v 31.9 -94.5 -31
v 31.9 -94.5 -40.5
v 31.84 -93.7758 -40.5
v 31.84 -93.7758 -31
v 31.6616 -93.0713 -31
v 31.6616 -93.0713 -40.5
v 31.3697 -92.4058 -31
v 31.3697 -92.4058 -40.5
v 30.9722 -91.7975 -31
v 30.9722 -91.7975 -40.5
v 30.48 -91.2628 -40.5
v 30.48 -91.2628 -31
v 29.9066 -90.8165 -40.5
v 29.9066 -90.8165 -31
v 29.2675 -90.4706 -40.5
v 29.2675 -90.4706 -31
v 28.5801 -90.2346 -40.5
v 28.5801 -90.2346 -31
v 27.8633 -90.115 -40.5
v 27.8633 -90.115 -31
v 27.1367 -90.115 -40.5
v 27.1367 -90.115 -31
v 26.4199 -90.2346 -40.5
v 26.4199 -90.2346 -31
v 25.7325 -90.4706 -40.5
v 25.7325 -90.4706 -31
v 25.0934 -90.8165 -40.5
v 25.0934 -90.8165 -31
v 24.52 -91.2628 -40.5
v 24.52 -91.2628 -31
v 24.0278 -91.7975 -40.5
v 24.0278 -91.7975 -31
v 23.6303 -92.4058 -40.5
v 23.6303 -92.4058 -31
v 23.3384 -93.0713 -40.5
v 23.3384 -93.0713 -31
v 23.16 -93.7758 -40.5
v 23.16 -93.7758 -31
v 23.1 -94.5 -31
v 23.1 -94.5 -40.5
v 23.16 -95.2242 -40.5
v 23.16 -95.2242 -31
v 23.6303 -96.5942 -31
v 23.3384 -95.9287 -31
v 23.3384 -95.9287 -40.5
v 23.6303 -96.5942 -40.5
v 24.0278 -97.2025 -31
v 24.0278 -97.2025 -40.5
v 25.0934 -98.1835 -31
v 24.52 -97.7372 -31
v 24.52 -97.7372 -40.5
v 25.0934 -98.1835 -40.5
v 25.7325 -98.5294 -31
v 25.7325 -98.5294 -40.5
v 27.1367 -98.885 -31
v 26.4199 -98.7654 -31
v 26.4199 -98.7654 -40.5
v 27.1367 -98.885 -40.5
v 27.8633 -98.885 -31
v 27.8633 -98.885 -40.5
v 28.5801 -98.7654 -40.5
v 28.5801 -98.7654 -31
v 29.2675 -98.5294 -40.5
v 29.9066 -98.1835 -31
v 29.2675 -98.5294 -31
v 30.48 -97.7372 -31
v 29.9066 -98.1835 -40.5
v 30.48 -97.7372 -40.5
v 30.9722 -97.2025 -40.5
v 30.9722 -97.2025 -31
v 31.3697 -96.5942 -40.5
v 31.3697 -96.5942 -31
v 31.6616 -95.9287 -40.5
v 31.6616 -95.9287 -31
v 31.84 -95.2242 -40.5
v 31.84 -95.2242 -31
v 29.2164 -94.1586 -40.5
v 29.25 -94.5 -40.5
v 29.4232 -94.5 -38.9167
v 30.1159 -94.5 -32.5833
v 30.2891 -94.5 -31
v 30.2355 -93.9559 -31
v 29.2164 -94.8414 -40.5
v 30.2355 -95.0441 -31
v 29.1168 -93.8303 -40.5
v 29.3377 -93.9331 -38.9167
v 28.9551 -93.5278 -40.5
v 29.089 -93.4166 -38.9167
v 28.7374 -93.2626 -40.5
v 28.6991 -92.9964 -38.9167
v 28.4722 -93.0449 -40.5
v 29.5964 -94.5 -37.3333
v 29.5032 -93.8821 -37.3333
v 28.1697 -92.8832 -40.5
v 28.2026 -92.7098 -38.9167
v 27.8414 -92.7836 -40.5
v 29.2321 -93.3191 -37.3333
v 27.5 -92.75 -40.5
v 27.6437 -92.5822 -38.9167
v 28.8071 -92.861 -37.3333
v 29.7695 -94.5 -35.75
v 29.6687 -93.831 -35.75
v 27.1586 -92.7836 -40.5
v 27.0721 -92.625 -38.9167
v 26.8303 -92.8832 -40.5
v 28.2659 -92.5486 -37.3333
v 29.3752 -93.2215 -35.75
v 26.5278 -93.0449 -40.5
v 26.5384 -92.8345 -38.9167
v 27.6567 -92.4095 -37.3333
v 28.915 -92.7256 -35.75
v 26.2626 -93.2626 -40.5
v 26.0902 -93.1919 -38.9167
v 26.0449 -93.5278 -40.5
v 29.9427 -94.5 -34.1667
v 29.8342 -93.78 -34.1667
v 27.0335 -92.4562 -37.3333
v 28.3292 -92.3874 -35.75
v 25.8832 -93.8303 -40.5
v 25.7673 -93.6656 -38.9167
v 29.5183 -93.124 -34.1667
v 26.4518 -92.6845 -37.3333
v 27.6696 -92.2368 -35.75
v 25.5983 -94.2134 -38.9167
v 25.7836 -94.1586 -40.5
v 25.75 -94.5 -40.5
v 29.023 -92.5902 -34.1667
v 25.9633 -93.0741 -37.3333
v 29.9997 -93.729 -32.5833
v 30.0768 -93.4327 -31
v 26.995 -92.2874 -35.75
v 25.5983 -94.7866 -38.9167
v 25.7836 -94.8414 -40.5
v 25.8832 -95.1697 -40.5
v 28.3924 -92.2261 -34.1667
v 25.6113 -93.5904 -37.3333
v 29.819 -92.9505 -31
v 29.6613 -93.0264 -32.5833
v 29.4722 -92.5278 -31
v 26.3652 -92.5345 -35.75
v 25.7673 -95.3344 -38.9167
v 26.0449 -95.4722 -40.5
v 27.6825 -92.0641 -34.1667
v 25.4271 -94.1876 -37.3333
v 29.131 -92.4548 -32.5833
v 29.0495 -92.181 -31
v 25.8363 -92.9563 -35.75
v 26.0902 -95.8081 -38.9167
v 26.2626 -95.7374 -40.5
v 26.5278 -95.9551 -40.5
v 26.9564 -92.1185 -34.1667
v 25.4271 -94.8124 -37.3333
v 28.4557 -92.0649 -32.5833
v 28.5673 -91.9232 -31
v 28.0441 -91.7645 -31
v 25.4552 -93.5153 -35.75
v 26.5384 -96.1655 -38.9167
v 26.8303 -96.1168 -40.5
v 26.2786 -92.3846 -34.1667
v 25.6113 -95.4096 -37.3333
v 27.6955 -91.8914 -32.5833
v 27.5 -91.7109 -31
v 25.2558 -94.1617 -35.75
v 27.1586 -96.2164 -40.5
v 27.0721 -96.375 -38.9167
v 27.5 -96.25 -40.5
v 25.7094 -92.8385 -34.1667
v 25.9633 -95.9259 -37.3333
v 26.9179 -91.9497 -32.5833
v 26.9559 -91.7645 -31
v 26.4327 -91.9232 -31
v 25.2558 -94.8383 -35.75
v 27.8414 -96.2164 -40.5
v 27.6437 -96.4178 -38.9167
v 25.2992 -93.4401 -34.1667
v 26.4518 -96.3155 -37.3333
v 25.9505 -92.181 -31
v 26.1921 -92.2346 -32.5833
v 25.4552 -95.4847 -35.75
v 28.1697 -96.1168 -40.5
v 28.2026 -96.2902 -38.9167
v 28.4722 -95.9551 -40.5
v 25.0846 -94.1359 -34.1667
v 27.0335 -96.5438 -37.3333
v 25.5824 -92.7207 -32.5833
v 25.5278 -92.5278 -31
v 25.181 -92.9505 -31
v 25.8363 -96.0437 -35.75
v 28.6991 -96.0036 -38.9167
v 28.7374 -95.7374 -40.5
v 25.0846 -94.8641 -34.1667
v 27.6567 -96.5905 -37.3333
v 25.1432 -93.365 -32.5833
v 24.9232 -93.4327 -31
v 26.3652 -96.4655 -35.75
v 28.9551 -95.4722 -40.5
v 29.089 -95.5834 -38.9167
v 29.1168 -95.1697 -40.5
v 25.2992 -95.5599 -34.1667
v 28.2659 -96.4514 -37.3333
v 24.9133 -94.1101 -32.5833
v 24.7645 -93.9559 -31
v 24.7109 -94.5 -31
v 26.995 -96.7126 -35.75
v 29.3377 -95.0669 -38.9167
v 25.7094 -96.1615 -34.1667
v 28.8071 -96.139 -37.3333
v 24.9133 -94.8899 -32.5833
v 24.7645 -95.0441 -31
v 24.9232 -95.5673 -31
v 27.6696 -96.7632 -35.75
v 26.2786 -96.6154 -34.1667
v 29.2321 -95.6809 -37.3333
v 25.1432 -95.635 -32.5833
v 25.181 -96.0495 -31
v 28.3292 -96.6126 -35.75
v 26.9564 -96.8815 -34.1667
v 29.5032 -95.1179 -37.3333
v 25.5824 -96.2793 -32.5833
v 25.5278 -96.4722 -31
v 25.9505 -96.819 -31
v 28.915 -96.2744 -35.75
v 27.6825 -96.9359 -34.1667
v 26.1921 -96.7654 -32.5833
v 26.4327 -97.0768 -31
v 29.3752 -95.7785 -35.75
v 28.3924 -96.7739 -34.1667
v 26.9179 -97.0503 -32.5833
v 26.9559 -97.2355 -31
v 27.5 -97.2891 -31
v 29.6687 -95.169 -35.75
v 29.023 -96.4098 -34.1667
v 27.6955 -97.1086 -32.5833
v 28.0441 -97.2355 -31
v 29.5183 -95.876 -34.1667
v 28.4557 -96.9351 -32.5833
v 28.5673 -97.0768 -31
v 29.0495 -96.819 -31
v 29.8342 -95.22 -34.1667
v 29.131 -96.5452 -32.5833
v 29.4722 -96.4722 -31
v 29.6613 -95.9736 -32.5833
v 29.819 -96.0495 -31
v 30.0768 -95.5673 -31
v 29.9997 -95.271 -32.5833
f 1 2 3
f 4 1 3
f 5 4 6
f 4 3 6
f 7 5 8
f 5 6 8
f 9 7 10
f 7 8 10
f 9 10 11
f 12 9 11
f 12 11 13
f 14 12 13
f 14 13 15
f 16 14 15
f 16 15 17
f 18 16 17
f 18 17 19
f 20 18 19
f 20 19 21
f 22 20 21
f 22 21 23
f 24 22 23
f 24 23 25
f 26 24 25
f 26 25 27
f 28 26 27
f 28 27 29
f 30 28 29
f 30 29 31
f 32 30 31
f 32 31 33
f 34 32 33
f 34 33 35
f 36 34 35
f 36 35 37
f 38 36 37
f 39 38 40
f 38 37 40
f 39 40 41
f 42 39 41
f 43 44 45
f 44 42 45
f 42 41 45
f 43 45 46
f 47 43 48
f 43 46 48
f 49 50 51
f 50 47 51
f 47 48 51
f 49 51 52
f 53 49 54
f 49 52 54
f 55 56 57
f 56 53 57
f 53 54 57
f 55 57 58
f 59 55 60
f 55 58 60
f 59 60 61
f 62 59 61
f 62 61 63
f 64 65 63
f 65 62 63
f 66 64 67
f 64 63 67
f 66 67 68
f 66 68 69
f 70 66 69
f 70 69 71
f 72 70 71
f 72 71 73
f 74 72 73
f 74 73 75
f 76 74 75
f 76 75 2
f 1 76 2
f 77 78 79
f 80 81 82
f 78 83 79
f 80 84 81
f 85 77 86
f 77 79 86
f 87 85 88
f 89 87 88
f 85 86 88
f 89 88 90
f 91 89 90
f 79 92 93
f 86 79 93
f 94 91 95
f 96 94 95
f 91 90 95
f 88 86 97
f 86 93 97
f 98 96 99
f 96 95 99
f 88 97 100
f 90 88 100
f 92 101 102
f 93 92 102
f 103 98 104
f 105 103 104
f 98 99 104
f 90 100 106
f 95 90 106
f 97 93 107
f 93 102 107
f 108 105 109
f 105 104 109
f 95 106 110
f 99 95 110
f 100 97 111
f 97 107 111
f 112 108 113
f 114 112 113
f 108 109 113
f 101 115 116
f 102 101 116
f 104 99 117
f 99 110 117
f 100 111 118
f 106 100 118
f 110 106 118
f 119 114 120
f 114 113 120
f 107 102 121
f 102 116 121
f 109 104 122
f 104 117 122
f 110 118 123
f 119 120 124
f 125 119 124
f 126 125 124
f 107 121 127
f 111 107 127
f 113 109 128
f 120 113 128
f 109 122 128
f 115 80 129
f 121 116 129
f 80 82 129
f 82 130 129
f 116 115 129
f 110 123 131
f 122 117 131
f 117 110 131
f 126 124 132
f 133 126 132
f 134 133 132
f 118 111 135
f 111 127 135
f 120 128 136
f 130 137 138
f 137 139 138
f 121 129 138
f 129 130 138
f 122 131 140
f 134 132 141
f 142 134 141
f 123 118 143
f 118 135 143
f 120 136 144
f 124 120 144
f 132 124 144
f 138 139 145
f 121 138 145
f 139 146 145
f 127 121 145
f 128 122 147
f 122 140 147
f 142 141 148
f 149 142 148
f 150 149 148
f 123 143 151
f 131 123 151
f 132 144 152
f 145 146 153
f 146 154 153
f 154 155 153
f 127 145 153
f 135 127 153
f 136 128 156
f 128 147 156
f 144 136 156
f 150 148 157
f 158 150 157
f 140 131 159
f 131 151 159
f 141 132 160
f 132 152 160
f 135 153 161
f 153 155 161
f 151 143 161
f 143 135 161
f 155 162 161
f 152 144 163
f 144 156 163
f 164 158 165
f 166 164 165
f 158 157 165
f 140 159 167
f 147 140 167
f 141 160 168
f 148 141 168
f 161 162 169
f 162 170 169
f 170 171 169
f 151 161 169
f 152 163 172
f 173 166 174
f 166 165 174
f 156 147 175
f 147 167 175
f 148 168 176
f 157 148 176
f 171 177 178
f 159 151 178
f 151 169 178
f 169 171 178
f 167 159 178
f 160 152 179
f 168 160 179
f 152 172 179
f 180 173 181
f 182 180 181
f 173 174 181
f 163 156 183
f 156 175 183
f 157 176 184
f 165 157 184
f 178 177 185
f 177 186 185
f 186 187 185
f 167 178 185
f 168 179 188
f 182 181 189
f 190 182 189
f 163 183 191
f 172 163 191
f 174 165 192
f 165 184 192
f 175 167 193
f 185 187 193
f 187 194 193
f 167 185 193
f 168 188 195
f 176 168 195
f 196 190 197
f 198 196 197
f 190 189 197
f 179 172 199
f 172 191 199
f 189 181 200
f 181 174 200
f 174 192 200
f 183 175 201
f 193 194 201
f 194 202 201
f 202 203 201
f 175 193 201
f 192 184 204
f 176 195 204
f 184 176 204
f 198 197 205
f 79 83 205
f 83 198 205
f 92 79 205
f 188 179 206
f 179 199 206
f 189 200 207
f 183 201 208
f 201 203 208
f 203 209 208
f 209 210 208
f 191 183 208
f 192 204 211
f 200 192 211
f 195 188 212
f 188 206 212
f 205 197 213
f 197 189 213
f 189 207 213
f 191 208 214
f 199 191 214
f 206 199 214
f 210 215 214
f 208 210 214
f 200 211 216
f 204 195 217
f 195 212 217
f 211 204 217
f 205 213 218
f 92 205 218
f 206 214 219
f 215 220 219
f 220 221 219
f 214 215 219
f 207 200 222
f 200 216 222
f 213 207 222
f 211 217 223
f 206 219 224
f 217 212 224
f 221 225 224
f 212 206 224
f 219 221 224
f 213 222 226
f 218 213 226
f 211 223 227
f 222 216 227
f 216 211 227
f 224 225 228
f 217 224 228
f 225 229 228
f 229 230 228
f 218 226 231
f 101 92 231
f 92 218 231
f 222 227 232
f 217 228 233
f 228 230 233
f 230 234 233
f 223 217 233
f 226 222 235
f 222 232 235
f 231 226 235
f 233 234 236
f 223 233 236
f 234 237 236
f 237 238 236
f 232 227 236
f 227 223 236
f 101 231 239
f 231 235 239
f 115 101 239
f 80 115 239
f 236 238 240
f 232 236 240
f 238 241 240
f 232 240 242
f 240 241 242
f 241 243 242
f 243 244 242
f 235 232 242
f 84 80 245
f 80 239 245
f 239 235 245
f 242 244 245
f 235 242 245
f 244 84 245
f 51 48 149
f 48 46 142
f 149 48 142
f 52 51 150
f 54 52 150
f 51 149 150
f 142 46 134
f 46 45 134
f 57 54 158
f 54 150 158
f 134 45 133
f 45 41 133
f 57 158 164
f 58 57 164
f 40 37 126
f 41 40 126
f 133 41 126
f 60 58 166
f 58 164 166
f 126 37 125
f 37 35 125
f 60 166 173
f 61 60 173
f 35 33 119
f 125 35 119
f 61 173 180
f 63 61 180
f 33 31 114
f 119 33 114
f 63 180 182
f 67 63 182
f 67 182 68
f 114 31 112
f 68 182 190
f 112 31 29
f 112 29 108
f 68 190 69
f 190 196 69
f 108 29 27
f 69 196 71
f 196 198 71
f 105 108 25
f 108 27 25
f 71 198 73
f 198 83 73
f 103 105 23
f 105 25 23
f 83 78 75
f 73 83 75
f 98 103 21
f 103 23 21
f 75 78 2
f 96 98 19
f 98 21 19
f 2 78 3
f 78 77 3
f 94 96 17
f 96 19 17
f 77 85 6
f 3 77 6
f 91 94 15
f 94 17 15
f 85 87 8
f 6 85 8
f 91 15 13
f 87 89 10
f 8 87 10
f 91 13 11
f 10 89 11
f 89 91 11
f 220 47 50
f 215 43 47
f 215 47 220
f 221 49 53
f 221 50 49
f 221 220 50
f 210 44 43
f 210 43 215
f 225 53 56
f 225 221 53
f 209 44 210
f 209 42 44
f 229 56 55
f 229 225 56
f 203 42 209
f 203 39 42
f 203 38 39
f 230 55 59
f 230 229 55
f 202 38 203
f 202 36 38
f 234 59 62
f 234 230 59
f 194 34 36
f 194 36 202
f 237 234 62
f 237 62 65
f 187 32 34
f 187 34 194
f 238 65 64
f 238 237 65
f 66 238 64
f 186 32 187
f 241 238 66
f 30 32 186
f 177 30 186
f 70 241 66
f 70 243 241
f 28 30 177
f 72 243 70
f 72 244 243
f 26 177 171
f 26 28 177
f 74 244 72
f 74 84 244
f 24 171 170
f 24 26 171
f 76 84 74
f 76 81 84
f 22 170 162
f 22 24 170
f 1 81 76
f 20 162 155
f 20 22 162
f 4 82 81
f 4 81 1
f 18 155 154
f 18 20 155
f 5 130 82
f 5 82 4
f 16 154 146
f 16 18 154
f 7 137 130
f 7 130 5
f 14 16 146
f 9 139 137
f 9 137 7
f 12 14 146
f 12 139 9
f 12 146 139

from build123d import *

# Parameters (mm, degrees)
BOX048_W          = 10
BOX048_H          = 10
BOX048_DEPTH      = 6.5
CYLINDER028_R     = 4.4
CYLINDER028_DEPTH = 16


with BuildPart() as cube010:
    # Box048 → Box048 (new body)
    with BuildSketch(Plane(origin=(22.5, -99.5, -31), x_dir=(1, 0, 0), z_dir=(0, 0, 1))):
        with Locations((5, 5)):
            Rectangle(BOX048_W, BOX048_H)
    extrude(amount=BOX048_DEPTH)


with BuildPart() as cone:
    # Cone → Cone (revolve)
    with BuildSketch(Plane(origin=(27.5, -94.5, 71), x_dir=(1, 0, 0), z_dir=(0, -1, 0))):
        Polygon((0, 0), (1.75, 0), (3.5, 16), (0, 16), align=None)
    revolve(axis=Axis((27.5, -94.5, 71), (0, 0, 1)))


with BuildPart() as cut007:
    # Cylinder028 → Cylinder028 (new body)
    with BuildSketch(Plane(origin=(27.5, -94.5, 71), x_dir=(1, 0, 0), z_dir=(0, 0, 1))):
        Circle(CYLINDER028_R)
    extrude(amount=CYLINDER028_DEPTH)

    # Cut006: cut Cone
    add(cone.part, mode=Mode.SUBTRACT)


with BuildPart() as cut007_1:
    # Cut006 placement: moved
    add(cut007.part.moved(Location((0, 0, -111.5))))

    # Cut007: cut Cube010
    add(cube010.part, mode=Mode.SUBTRACT)


solid = cut007_1.part
